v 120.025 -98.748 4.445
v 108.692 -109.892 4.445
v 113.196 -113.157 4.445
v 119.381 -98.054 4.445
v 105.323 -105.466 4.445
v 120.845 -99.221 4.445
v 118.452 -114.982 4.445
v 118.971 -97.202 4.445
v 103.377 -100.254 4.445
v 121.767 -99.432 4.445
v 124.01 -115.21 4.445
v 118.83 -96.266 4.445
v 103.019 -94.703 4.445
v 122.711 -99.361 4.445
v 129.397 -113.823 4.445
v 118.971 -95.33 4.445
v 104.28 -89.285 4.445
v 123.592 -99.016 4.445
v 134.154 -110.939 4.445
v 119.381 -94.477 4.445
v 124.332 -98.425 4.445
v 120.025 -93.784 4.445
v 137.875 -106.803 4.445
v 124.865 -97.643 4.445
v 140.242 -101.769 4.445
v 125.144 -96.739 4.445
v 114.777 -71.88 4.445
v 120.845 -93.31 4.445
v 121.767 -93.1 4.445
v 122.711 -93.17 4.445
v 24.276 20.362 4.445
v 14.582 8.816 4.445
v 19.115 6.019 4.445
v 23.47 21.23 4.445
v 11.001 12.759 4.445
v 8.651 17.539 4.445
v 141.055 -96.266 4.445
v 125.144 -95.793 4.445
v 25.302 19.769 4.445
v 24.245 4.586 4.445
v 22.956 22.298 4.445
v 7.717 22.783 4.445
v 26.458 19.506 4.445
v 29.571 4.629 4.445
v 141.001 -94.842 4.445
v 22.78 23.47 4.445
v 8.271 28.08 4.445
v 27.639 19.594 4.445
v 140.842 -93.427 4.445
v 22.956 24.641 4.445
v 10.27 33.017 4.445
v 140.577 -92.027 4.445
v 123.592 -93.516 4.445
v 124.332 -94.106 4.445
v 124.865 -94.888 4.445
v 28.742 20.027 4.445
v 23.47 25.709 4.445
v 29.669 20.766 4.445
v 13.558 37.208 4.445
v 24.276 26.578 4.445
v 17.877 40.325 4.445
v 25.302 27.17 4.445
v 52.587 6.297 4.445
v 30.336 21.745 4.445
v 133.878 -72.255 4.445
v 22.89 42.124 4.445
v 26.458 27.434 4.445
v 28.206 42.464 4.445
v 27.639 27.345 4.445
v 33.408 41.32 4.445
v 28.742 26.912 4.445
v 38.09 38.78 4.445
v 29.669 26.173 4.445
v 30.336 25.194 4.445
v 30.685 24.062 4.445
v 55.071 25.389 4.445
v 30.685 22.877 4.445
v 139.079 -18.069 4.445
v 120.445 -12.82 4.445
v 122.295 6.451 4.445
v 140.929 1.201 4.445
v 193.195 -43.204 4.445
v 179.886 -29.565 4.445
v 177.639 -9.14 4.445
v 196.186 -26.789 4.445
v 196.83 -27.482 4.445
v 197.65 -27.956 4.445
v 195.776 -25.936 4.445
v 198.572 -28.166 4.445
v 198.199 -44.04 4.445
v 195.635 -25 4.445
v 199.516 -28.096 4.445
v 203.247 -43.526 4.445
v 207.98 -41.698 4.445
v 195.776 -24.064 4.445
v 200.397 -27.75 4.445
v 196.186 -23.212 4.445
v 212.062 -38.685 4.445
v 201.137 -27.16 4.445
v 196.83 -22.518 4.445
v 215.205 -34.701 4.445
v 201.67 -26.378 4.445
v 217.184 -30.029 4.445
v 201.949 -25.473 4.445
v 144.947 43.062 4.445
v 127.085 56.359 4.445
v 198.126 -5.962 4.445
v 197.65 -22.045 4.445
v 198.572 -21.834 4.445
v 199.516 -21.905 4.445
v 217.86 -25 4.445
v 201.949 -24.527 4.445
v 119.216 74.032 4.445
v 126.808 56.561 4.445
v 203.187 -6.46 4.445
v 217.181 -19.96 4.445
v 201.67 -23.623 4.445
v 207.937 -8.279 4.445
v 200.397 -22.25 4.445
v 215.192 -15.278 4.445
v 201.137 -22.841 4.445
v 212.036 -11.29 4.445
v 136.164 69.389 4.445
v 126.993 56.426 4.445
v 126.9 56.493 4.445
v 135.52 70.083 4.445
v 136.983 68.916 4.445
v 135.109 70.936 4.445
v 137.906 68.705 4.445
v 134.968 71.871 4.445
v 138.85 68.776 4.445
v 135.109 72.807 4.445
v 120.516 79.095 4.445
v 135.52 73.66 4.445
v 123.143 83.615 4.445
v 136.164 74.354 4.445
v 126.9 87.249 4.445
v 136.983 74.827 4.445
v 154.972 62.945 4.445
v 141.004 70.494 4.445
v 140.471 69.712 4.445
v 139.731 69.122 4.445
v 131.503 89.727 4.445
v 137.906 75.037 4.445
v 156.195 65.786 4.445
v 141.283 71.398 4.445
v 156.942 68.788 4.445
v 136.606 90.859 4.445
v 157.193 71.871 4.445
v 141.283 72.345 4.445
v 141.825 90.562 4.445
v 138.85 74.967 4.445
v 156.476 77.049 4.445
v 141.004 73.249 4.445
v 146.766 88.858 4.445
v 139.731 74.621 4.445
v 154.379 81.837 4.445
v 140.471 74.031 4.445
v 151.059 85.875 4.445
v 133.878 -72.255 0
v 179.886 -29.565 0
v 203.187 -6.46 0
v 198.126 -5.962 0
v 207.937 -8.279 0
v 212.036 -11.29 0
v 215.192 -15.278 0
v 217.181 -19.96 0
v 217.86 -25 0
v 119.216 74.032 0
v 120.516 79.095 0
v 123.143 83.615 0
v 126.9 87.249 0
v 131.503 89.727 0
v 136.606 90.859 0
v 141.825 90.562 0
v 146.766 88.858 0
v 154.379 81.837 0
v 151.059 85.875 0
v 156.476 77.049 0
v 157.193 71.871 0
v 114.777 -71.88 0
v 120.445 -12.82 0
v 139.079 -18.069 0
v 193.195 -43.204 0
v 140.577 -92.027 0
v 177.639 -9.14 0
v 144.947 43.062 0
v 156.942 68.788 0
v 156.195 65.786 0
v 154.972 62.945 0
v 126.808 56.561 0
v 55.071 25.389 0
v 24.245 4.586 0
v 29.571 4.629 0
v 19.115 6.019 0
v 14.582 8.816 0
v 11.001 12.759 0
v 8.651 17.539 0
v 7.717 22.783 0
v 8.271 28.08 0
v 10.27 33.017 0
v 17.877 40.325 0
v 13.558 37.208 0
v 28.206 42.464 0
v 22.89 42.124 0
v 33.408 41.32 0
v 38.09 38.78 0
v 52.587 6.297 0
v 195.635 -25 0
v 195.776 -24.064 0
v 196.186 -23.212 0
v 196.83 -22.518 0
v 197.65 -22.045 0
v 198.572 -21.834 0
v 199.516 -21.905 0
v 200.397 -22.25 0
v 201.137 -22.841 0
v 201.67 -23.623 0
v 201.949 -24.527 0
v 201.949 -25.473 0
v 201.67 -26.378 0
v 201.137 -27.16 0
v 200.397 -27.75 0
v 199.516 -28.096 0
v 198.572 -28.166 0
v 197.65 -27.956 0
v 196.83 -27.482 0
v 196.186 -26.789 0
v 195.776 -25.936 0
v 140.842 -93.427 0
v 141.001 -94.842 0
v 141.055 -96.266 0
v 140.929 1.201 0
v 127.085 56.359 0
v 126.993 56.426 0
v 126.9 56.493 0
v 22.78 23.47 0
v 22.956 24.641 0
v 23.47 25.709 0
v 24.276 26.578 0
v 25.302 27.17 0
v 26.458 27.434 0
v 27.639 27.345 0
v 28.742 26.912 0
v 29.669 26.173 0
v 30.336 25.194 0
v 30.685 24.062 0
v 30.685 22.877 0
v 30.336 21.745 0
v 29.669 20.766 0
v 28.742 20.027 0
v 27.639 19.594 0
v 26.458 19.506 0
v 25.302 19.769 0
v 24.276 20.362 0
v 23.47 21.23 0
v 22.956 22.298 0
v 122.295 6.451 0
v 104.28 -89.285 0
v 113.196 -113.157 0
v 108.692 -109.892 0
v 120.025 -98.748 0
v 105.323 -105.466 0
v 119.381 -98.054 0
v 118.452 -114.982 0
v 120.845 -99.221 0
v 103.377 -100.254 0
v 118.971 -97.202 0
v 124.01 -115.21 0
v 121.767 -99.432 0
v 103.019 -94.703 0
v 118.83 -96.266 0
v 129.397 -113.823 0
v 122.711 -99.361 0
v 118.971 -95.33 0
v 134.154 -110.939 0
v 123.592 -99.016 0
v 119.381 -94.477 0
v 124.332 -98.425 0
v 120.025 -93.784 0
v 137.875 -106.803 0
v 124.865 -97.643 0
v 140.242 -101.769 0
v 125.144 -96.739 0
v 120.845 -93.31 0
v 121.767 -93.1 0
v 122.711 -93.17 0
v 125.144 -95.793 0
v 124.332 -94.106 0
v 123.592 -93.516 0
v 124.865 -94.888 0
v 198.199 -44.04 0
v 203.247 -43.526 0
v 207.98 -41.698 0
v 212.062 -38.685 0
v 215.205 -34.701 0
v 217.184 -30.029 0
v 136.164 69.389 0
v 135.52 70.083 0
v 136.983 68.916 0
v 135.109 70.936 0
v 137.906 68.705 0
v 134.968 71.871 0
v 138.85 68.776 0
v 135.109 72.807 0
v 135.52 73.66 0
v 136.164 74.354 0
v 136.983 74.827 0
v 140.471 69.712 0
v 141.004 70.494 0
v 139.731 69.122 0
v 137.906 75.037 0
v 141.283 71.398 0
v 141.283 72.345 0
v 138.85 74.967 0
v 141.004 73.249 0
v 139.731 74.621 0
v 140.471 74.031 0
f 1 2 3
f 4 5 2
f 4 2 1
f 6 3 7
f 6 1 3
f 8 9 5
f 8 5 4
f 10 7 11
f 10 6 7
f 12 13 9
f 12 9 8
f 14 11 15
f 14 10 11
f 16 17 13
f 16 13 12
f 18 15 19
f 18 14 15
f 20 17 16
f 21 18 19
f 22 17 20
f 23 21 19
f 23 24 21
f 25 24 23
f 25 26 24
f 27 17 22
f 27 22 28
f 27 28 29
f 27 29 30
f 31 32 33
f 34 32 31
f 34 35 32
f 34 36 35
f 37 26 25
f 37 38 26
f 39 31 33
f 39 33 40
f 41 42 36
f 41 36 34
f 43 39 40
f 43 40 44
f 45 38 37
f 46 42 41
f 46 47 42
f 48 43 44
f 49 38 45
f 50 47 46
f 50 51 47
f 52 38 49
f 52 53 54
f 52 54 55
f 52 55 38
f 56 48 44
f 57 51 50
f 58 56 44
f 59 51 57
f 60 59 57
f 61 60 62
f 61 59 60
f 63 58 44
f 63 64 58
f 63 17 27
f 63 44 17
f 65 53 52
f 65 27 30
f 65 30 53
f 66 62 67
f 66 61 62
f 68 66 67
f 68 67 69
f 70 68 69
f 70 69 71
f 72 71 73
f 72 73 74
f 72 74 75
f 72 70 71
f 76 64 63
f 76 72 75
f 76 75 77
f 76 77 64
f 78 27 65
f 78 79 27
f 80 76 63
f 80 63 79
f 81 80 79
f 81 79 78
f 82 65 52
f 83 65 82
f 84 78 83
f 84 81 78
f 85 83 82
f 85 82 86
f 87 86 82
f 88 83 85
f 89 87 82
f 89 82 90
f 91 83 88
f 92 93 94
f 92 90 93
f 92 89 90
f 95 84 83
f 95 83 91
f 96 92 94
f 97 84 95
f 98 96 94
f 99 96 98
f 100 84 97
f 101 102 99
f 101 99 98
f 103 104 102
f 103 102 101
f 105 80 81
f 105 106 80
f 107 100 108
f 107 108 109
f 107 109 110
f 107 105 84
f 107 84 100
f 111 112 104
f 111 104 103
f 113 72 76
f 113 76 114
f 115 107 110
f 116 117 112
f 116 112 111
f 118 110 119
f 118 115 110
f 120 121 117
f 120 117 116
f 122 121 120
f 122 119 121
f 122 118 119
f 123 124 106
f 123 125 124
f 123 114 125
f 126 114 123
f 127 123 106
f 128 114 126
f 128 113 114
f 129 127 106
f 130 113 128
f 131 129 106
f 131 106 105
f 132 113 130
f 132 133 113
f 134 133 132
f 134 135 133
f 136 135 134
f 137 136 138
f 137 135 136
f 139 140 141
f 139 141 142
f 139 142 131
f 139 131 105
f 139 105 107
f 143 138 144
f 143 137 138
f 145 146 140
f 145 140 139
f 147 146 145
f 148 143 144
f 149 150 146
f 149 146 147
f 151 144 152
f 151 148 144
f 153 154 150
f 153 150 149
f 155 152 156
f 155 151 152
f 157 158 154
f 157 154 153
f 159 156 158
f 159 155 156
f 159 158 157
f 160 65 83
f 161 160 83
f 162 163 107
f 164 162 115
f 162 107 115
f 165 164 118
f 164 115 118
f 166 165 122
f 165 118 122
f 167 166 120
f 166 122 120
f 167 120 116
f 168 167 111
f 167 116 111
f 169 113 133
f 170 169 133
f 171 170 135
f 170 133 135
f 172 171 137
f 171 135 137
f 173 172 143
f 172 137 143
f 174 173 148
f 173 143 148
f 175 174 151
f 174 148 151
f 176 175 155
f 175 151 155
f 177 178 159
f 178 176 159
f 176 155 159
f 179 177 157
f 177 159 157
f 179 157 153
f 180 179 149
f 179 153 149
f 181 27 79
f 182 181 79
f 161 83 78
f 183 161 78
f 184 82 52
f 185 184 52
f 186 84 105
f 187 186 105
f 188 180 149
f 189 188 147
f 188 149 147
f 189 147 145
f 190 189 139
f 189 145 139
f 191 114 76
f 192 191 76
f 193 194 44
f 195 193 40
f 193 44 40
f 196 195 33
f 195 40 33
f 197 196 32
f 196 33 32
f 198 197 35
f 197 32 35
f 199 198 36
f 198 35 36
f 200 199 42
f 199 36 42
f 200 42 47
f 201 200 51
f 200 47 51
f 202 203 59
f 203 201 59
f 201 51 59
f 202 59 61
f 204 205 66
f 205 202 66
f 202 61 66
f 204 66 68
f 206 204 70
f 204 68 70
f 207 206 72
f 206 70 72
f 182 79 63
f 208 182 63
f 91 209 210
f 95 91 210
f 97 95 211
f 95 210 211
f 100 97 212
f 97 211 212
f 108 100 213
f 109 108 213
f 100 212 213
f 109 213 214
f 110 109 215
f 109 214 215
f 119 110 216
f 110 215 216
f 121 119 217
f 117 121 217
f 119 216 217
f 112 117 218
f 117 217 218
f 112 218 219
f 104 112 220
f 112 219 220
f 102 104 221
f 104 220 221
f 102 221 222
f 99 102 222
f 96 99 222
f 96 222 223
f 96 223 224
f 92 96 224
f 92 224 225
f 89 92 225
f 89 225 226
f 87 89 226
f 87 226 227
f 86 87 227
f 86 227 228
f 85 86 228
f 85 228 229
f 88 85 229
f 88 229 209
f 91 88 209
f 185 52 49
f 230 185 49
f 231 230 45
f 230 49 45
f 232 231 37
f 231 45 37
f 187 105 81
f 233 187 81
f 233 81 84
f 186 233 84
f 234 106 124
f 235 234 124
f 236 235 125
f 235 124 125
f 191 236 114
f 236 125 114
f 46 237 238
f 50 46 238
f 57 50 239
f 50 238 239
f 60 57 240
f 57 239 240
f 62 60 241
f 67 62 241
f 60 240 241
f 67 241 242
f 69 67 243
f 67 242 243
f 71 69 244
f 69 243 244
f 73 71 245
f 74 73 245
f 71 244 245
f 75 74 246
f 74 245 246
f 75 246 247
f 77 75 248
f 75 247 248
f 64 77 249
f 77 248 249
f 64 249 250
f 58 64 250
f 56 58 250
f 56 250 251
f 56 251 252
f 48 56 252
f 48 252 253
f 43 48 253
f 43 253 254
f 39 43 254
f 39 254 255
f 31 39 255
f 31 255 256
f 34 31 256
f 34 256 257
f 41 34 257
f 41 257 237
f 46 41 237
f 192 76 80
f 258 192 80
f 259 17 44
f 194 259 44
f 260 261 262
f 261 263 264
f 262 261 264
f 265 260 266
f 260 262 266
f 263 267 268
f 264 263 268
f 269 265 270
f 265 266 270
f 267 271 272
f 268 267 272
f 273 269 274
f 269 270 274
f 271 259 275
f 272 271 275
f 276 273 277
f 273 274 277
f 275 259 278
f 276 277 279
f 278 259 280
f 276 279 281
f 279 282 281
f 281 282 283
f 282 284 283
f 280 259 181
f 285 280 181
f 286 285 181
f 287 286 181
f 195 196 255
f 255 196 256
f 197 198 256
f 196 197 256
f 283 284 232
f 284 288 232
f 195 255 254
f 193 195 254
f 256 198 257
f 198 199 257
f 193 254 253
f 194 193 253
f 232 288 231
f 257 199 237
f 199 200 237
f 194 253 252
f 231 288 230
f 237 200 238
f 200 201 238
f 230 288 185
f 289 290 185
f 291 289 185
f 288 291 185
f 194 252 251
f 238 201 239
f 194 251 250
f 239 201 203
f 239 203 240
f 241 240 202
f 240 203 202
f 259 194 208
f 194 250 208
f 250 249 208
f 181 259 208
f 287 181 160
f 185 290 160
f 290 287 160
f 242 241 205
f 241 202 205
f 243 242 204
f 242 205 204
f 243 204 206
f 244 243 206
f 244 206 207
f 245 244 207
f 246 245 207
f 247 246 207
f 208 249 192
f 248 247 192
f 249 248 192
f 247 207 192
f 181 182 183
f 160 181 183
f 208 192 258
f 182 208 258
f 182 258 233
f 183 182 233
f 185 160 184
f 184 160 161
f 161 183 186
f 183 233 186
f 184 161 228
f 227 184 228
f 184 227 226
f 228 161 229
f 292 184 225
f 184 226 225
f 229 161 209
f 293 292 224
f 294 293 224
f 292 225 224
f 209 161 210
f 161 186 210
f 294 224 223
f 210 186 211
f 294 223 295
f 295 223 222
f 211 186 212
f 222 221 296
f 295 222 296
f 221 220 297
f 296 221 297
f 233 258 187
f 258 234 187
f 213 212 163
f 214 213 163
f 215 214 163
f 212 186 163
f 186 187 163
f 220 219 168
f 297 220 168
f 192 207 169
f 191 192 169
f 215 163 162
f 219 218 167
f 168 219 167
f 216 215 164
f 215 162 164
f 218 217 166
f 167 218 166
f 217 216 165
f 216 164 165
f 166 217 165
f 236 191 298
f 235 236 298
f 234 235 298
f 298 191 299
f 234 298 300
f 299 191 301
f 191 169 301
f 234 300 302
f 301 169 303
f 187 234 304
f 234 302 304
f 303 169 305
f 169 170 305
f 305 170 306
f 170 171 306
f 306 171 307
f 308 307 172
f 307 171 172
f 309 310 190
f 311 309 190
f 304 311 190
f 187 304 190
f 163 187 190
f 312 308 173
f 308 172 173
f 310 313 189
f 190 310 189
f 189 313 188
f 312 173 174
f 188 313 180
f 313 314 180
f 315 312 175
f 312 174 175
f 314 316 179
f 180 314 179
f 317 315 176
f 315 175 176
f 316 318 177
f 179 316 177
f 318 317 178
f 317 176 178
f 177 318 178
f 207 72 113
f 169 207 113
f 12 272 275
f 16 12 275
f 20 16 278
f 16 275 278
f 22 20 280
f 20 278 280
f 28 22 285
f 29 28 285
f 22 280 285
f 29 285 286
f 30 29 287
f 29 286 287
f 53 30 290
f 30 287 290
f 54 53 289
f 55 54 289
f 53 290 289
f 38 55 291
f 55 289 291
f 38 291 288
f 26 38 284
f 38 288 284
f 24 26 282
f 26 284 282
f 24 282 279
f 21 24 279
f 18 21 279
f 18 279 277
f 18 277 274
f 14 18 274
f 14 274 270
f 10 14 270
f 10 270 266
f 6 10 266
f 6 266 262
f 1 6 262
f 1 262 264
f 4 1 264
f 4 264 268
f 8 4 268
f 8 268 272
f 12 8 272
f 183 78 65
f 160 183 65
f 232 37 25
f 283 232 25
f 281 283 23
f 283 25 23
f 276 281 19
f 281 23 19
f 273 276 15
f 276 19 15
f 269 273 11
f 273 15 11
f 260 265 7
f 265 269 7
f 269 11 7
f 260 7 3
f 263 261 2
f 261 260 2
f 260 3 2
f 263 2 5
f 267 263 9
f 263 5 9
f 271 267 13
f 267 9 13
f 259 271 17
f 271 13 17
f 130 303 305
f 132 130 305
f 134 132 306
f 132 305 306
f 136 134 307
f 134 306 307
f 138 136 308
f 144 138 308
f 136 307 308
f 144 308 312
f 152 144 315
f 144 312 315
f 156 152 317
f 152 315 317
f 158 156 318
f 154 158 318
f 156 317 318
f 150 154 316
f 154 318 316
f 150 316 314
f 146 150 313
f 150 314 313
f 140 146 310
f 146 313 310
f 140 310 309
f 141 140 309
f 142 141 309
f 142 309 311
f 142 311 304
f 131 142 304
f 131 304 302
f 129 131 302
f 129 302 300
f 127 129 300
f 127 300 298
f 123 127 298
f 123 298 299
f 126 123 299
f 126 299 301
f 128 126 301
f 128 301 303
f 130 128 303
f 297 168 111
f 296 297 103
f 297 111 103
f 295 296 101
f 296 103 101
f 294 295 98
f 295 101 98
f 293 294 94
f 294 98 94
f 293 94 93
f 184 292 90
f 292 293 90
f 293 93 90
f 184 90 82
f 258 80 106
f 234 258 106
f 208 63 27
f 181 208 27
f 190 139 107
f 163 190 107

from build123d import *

# Parameters (mm, degrees)
SKETCH2_W           = 457.2
SKETCH2_H           = 457.2
BOSS_EXTRUDE3_DEPTH = 4.445
SKETCH3_R           = 3.175
SKETCH3_R_2         = 3.9751
CUT_EXTRUDE1_DEPTH  = 324.31977673
SKETCH4_W           = 457.2
SKETCH4_H           = 457.2
SKETCH4_R           = 3.175
CUT_EXTRUDE2_DEPTH  = 324.31977673


with BuildPart() as part:
    # Sketch2 → Boss-Extrude3 (new body)
    with BuildSketch(Plane.XY):
        Rectangle(SKETCH2_W, SKETCH2_H)
    extrude(amount=BOSS_EXTRUDE3_DEPTH)

    # Sketch3 → Cut-Extrude1 (cut, through all)
    with BuildSketch(Plane(origin=(0, 0, 0), x_dir=(-1, 0, 0), z_dir=(0, 0, -1))):
        with Locations((-138.143199548, 71.871365193)):
            Circle(SKETCH3_R)
        with Locations((-198.809547248, -25.000118004)):
            Circle(SKETCH3_R)
        with Locations((-122.004659563, -96.265887155)):
            Circle(SKETCH3_R)
        with Locations((-26.754659563, -96.265887155)):
            Circle(SKETCH3_R)
        with Locations((-26.754659563, 23.469712845)):
            Circle(SKETCH3_R_2)
    extrude(amount=-CUT_EXTRUDE1_DEPTH, mode=Mode.SUBTRACT)

    # Sketch4 → Cut-Extrude2 (cut, through all)
    # profile 1 of 5: a face of its own
    with BuildSketch(Plane.XY.offset(4.445)):
        Rectangle(SKETCH4_W, SKETCH4_H)
        with Locations((26.754659563, -96.265887155)):
            Circle(SKETCH4_R, mode=Mode.SUBTRACT)
        with BuildLine():
            Line((104.279919091, -89.284764381), (29.57120013, 4.629075933))
            ThreePointArc((29.57120013, 4.629075933), (8.270979184, 28.080142289), (38.089671454, 38.780493538))
            Line((38.089671454, 38.780493538), (119.216168571, 74.032383096))
            ThreePointArc((119.216168571, 74.032383096), (139.225456422, 90.890598092), (157.193199548, 71.871365193))
            ThreePointArc((157.193199548, 71.871365193), (156.629627395, 67.271964637), (154.972256192, 62.944699943))
            Line((154.972256192, 62.944699943), (198.125737804, -5.962394804))
            ThreePointArc((198.125737804, -5.962394804), (212.035958895, -11.290102141), (217.859547248, -25.000118004))
            ThreePointArc((217.859547248, -25.000118004), (210.121888692, -40.327656327), (193.194620104, -43.203828976))
            Line((193.194620104, -43.203828976), (140.576999281, -92.026701216))
            ThreePointArc((140.576999281, -92.026701216), (140.934867851, -94.13288125), (141.054659563, -96.265887155))
            ThreePointArc((141.054659563, -96.265887155), (118.451759762, -114.981639959), (104.279919091, -89.284764381))
        make_face(mode=Mode.SUBTRACT)
    # profile 2 of 5: a face of its own
    with BuildSketch(Plane.XY.offset(4.445)):
        with BuildLine():
            ThreePointArc((127.085491453, 56.359125133), (126.946386449, 56.459231128), (126.808187657, 56.5605845))
            Line((126.808187657, 56.5605845), (55.070704112, 25.388502171))
            Line((55.070704112, 25.388502171), (122.29505865, 6.450632186))
            Line((122.29505865, 6.450632186), (127.085491453, 56.359125133))
        make_face()
    # profile 3 of 5: a face of its own
    with BuildSketch(Plane.XY.offset(4.445)):
        Polygon((144.946705866, 43.06176458), (140.928758156, 1.201305791), (177.638536292, -9.140258814), align=None)
    # profile 4 of 5: a face of its own
    with BuildSketch(Plane.XY.offset(4.445)):
        Polygon((179.886249099, -29.564951481), (139.079100318, -18.069110674), (133.87810257, -72.255020413), align=None)
    # profile 5 of 5: a face of its own
    with BuildSketch(Plane.XY.offset(4.445)):
        Polygon((120.445400812, -12.81978428), (52.587094953, 6.296677047), (114.776579601, -71.879651121), align=None)
    extrude(amount=-CUT_EXTRUDE2_DEPTH, mode=Mode.SUBTRACT)


solid = part.part
